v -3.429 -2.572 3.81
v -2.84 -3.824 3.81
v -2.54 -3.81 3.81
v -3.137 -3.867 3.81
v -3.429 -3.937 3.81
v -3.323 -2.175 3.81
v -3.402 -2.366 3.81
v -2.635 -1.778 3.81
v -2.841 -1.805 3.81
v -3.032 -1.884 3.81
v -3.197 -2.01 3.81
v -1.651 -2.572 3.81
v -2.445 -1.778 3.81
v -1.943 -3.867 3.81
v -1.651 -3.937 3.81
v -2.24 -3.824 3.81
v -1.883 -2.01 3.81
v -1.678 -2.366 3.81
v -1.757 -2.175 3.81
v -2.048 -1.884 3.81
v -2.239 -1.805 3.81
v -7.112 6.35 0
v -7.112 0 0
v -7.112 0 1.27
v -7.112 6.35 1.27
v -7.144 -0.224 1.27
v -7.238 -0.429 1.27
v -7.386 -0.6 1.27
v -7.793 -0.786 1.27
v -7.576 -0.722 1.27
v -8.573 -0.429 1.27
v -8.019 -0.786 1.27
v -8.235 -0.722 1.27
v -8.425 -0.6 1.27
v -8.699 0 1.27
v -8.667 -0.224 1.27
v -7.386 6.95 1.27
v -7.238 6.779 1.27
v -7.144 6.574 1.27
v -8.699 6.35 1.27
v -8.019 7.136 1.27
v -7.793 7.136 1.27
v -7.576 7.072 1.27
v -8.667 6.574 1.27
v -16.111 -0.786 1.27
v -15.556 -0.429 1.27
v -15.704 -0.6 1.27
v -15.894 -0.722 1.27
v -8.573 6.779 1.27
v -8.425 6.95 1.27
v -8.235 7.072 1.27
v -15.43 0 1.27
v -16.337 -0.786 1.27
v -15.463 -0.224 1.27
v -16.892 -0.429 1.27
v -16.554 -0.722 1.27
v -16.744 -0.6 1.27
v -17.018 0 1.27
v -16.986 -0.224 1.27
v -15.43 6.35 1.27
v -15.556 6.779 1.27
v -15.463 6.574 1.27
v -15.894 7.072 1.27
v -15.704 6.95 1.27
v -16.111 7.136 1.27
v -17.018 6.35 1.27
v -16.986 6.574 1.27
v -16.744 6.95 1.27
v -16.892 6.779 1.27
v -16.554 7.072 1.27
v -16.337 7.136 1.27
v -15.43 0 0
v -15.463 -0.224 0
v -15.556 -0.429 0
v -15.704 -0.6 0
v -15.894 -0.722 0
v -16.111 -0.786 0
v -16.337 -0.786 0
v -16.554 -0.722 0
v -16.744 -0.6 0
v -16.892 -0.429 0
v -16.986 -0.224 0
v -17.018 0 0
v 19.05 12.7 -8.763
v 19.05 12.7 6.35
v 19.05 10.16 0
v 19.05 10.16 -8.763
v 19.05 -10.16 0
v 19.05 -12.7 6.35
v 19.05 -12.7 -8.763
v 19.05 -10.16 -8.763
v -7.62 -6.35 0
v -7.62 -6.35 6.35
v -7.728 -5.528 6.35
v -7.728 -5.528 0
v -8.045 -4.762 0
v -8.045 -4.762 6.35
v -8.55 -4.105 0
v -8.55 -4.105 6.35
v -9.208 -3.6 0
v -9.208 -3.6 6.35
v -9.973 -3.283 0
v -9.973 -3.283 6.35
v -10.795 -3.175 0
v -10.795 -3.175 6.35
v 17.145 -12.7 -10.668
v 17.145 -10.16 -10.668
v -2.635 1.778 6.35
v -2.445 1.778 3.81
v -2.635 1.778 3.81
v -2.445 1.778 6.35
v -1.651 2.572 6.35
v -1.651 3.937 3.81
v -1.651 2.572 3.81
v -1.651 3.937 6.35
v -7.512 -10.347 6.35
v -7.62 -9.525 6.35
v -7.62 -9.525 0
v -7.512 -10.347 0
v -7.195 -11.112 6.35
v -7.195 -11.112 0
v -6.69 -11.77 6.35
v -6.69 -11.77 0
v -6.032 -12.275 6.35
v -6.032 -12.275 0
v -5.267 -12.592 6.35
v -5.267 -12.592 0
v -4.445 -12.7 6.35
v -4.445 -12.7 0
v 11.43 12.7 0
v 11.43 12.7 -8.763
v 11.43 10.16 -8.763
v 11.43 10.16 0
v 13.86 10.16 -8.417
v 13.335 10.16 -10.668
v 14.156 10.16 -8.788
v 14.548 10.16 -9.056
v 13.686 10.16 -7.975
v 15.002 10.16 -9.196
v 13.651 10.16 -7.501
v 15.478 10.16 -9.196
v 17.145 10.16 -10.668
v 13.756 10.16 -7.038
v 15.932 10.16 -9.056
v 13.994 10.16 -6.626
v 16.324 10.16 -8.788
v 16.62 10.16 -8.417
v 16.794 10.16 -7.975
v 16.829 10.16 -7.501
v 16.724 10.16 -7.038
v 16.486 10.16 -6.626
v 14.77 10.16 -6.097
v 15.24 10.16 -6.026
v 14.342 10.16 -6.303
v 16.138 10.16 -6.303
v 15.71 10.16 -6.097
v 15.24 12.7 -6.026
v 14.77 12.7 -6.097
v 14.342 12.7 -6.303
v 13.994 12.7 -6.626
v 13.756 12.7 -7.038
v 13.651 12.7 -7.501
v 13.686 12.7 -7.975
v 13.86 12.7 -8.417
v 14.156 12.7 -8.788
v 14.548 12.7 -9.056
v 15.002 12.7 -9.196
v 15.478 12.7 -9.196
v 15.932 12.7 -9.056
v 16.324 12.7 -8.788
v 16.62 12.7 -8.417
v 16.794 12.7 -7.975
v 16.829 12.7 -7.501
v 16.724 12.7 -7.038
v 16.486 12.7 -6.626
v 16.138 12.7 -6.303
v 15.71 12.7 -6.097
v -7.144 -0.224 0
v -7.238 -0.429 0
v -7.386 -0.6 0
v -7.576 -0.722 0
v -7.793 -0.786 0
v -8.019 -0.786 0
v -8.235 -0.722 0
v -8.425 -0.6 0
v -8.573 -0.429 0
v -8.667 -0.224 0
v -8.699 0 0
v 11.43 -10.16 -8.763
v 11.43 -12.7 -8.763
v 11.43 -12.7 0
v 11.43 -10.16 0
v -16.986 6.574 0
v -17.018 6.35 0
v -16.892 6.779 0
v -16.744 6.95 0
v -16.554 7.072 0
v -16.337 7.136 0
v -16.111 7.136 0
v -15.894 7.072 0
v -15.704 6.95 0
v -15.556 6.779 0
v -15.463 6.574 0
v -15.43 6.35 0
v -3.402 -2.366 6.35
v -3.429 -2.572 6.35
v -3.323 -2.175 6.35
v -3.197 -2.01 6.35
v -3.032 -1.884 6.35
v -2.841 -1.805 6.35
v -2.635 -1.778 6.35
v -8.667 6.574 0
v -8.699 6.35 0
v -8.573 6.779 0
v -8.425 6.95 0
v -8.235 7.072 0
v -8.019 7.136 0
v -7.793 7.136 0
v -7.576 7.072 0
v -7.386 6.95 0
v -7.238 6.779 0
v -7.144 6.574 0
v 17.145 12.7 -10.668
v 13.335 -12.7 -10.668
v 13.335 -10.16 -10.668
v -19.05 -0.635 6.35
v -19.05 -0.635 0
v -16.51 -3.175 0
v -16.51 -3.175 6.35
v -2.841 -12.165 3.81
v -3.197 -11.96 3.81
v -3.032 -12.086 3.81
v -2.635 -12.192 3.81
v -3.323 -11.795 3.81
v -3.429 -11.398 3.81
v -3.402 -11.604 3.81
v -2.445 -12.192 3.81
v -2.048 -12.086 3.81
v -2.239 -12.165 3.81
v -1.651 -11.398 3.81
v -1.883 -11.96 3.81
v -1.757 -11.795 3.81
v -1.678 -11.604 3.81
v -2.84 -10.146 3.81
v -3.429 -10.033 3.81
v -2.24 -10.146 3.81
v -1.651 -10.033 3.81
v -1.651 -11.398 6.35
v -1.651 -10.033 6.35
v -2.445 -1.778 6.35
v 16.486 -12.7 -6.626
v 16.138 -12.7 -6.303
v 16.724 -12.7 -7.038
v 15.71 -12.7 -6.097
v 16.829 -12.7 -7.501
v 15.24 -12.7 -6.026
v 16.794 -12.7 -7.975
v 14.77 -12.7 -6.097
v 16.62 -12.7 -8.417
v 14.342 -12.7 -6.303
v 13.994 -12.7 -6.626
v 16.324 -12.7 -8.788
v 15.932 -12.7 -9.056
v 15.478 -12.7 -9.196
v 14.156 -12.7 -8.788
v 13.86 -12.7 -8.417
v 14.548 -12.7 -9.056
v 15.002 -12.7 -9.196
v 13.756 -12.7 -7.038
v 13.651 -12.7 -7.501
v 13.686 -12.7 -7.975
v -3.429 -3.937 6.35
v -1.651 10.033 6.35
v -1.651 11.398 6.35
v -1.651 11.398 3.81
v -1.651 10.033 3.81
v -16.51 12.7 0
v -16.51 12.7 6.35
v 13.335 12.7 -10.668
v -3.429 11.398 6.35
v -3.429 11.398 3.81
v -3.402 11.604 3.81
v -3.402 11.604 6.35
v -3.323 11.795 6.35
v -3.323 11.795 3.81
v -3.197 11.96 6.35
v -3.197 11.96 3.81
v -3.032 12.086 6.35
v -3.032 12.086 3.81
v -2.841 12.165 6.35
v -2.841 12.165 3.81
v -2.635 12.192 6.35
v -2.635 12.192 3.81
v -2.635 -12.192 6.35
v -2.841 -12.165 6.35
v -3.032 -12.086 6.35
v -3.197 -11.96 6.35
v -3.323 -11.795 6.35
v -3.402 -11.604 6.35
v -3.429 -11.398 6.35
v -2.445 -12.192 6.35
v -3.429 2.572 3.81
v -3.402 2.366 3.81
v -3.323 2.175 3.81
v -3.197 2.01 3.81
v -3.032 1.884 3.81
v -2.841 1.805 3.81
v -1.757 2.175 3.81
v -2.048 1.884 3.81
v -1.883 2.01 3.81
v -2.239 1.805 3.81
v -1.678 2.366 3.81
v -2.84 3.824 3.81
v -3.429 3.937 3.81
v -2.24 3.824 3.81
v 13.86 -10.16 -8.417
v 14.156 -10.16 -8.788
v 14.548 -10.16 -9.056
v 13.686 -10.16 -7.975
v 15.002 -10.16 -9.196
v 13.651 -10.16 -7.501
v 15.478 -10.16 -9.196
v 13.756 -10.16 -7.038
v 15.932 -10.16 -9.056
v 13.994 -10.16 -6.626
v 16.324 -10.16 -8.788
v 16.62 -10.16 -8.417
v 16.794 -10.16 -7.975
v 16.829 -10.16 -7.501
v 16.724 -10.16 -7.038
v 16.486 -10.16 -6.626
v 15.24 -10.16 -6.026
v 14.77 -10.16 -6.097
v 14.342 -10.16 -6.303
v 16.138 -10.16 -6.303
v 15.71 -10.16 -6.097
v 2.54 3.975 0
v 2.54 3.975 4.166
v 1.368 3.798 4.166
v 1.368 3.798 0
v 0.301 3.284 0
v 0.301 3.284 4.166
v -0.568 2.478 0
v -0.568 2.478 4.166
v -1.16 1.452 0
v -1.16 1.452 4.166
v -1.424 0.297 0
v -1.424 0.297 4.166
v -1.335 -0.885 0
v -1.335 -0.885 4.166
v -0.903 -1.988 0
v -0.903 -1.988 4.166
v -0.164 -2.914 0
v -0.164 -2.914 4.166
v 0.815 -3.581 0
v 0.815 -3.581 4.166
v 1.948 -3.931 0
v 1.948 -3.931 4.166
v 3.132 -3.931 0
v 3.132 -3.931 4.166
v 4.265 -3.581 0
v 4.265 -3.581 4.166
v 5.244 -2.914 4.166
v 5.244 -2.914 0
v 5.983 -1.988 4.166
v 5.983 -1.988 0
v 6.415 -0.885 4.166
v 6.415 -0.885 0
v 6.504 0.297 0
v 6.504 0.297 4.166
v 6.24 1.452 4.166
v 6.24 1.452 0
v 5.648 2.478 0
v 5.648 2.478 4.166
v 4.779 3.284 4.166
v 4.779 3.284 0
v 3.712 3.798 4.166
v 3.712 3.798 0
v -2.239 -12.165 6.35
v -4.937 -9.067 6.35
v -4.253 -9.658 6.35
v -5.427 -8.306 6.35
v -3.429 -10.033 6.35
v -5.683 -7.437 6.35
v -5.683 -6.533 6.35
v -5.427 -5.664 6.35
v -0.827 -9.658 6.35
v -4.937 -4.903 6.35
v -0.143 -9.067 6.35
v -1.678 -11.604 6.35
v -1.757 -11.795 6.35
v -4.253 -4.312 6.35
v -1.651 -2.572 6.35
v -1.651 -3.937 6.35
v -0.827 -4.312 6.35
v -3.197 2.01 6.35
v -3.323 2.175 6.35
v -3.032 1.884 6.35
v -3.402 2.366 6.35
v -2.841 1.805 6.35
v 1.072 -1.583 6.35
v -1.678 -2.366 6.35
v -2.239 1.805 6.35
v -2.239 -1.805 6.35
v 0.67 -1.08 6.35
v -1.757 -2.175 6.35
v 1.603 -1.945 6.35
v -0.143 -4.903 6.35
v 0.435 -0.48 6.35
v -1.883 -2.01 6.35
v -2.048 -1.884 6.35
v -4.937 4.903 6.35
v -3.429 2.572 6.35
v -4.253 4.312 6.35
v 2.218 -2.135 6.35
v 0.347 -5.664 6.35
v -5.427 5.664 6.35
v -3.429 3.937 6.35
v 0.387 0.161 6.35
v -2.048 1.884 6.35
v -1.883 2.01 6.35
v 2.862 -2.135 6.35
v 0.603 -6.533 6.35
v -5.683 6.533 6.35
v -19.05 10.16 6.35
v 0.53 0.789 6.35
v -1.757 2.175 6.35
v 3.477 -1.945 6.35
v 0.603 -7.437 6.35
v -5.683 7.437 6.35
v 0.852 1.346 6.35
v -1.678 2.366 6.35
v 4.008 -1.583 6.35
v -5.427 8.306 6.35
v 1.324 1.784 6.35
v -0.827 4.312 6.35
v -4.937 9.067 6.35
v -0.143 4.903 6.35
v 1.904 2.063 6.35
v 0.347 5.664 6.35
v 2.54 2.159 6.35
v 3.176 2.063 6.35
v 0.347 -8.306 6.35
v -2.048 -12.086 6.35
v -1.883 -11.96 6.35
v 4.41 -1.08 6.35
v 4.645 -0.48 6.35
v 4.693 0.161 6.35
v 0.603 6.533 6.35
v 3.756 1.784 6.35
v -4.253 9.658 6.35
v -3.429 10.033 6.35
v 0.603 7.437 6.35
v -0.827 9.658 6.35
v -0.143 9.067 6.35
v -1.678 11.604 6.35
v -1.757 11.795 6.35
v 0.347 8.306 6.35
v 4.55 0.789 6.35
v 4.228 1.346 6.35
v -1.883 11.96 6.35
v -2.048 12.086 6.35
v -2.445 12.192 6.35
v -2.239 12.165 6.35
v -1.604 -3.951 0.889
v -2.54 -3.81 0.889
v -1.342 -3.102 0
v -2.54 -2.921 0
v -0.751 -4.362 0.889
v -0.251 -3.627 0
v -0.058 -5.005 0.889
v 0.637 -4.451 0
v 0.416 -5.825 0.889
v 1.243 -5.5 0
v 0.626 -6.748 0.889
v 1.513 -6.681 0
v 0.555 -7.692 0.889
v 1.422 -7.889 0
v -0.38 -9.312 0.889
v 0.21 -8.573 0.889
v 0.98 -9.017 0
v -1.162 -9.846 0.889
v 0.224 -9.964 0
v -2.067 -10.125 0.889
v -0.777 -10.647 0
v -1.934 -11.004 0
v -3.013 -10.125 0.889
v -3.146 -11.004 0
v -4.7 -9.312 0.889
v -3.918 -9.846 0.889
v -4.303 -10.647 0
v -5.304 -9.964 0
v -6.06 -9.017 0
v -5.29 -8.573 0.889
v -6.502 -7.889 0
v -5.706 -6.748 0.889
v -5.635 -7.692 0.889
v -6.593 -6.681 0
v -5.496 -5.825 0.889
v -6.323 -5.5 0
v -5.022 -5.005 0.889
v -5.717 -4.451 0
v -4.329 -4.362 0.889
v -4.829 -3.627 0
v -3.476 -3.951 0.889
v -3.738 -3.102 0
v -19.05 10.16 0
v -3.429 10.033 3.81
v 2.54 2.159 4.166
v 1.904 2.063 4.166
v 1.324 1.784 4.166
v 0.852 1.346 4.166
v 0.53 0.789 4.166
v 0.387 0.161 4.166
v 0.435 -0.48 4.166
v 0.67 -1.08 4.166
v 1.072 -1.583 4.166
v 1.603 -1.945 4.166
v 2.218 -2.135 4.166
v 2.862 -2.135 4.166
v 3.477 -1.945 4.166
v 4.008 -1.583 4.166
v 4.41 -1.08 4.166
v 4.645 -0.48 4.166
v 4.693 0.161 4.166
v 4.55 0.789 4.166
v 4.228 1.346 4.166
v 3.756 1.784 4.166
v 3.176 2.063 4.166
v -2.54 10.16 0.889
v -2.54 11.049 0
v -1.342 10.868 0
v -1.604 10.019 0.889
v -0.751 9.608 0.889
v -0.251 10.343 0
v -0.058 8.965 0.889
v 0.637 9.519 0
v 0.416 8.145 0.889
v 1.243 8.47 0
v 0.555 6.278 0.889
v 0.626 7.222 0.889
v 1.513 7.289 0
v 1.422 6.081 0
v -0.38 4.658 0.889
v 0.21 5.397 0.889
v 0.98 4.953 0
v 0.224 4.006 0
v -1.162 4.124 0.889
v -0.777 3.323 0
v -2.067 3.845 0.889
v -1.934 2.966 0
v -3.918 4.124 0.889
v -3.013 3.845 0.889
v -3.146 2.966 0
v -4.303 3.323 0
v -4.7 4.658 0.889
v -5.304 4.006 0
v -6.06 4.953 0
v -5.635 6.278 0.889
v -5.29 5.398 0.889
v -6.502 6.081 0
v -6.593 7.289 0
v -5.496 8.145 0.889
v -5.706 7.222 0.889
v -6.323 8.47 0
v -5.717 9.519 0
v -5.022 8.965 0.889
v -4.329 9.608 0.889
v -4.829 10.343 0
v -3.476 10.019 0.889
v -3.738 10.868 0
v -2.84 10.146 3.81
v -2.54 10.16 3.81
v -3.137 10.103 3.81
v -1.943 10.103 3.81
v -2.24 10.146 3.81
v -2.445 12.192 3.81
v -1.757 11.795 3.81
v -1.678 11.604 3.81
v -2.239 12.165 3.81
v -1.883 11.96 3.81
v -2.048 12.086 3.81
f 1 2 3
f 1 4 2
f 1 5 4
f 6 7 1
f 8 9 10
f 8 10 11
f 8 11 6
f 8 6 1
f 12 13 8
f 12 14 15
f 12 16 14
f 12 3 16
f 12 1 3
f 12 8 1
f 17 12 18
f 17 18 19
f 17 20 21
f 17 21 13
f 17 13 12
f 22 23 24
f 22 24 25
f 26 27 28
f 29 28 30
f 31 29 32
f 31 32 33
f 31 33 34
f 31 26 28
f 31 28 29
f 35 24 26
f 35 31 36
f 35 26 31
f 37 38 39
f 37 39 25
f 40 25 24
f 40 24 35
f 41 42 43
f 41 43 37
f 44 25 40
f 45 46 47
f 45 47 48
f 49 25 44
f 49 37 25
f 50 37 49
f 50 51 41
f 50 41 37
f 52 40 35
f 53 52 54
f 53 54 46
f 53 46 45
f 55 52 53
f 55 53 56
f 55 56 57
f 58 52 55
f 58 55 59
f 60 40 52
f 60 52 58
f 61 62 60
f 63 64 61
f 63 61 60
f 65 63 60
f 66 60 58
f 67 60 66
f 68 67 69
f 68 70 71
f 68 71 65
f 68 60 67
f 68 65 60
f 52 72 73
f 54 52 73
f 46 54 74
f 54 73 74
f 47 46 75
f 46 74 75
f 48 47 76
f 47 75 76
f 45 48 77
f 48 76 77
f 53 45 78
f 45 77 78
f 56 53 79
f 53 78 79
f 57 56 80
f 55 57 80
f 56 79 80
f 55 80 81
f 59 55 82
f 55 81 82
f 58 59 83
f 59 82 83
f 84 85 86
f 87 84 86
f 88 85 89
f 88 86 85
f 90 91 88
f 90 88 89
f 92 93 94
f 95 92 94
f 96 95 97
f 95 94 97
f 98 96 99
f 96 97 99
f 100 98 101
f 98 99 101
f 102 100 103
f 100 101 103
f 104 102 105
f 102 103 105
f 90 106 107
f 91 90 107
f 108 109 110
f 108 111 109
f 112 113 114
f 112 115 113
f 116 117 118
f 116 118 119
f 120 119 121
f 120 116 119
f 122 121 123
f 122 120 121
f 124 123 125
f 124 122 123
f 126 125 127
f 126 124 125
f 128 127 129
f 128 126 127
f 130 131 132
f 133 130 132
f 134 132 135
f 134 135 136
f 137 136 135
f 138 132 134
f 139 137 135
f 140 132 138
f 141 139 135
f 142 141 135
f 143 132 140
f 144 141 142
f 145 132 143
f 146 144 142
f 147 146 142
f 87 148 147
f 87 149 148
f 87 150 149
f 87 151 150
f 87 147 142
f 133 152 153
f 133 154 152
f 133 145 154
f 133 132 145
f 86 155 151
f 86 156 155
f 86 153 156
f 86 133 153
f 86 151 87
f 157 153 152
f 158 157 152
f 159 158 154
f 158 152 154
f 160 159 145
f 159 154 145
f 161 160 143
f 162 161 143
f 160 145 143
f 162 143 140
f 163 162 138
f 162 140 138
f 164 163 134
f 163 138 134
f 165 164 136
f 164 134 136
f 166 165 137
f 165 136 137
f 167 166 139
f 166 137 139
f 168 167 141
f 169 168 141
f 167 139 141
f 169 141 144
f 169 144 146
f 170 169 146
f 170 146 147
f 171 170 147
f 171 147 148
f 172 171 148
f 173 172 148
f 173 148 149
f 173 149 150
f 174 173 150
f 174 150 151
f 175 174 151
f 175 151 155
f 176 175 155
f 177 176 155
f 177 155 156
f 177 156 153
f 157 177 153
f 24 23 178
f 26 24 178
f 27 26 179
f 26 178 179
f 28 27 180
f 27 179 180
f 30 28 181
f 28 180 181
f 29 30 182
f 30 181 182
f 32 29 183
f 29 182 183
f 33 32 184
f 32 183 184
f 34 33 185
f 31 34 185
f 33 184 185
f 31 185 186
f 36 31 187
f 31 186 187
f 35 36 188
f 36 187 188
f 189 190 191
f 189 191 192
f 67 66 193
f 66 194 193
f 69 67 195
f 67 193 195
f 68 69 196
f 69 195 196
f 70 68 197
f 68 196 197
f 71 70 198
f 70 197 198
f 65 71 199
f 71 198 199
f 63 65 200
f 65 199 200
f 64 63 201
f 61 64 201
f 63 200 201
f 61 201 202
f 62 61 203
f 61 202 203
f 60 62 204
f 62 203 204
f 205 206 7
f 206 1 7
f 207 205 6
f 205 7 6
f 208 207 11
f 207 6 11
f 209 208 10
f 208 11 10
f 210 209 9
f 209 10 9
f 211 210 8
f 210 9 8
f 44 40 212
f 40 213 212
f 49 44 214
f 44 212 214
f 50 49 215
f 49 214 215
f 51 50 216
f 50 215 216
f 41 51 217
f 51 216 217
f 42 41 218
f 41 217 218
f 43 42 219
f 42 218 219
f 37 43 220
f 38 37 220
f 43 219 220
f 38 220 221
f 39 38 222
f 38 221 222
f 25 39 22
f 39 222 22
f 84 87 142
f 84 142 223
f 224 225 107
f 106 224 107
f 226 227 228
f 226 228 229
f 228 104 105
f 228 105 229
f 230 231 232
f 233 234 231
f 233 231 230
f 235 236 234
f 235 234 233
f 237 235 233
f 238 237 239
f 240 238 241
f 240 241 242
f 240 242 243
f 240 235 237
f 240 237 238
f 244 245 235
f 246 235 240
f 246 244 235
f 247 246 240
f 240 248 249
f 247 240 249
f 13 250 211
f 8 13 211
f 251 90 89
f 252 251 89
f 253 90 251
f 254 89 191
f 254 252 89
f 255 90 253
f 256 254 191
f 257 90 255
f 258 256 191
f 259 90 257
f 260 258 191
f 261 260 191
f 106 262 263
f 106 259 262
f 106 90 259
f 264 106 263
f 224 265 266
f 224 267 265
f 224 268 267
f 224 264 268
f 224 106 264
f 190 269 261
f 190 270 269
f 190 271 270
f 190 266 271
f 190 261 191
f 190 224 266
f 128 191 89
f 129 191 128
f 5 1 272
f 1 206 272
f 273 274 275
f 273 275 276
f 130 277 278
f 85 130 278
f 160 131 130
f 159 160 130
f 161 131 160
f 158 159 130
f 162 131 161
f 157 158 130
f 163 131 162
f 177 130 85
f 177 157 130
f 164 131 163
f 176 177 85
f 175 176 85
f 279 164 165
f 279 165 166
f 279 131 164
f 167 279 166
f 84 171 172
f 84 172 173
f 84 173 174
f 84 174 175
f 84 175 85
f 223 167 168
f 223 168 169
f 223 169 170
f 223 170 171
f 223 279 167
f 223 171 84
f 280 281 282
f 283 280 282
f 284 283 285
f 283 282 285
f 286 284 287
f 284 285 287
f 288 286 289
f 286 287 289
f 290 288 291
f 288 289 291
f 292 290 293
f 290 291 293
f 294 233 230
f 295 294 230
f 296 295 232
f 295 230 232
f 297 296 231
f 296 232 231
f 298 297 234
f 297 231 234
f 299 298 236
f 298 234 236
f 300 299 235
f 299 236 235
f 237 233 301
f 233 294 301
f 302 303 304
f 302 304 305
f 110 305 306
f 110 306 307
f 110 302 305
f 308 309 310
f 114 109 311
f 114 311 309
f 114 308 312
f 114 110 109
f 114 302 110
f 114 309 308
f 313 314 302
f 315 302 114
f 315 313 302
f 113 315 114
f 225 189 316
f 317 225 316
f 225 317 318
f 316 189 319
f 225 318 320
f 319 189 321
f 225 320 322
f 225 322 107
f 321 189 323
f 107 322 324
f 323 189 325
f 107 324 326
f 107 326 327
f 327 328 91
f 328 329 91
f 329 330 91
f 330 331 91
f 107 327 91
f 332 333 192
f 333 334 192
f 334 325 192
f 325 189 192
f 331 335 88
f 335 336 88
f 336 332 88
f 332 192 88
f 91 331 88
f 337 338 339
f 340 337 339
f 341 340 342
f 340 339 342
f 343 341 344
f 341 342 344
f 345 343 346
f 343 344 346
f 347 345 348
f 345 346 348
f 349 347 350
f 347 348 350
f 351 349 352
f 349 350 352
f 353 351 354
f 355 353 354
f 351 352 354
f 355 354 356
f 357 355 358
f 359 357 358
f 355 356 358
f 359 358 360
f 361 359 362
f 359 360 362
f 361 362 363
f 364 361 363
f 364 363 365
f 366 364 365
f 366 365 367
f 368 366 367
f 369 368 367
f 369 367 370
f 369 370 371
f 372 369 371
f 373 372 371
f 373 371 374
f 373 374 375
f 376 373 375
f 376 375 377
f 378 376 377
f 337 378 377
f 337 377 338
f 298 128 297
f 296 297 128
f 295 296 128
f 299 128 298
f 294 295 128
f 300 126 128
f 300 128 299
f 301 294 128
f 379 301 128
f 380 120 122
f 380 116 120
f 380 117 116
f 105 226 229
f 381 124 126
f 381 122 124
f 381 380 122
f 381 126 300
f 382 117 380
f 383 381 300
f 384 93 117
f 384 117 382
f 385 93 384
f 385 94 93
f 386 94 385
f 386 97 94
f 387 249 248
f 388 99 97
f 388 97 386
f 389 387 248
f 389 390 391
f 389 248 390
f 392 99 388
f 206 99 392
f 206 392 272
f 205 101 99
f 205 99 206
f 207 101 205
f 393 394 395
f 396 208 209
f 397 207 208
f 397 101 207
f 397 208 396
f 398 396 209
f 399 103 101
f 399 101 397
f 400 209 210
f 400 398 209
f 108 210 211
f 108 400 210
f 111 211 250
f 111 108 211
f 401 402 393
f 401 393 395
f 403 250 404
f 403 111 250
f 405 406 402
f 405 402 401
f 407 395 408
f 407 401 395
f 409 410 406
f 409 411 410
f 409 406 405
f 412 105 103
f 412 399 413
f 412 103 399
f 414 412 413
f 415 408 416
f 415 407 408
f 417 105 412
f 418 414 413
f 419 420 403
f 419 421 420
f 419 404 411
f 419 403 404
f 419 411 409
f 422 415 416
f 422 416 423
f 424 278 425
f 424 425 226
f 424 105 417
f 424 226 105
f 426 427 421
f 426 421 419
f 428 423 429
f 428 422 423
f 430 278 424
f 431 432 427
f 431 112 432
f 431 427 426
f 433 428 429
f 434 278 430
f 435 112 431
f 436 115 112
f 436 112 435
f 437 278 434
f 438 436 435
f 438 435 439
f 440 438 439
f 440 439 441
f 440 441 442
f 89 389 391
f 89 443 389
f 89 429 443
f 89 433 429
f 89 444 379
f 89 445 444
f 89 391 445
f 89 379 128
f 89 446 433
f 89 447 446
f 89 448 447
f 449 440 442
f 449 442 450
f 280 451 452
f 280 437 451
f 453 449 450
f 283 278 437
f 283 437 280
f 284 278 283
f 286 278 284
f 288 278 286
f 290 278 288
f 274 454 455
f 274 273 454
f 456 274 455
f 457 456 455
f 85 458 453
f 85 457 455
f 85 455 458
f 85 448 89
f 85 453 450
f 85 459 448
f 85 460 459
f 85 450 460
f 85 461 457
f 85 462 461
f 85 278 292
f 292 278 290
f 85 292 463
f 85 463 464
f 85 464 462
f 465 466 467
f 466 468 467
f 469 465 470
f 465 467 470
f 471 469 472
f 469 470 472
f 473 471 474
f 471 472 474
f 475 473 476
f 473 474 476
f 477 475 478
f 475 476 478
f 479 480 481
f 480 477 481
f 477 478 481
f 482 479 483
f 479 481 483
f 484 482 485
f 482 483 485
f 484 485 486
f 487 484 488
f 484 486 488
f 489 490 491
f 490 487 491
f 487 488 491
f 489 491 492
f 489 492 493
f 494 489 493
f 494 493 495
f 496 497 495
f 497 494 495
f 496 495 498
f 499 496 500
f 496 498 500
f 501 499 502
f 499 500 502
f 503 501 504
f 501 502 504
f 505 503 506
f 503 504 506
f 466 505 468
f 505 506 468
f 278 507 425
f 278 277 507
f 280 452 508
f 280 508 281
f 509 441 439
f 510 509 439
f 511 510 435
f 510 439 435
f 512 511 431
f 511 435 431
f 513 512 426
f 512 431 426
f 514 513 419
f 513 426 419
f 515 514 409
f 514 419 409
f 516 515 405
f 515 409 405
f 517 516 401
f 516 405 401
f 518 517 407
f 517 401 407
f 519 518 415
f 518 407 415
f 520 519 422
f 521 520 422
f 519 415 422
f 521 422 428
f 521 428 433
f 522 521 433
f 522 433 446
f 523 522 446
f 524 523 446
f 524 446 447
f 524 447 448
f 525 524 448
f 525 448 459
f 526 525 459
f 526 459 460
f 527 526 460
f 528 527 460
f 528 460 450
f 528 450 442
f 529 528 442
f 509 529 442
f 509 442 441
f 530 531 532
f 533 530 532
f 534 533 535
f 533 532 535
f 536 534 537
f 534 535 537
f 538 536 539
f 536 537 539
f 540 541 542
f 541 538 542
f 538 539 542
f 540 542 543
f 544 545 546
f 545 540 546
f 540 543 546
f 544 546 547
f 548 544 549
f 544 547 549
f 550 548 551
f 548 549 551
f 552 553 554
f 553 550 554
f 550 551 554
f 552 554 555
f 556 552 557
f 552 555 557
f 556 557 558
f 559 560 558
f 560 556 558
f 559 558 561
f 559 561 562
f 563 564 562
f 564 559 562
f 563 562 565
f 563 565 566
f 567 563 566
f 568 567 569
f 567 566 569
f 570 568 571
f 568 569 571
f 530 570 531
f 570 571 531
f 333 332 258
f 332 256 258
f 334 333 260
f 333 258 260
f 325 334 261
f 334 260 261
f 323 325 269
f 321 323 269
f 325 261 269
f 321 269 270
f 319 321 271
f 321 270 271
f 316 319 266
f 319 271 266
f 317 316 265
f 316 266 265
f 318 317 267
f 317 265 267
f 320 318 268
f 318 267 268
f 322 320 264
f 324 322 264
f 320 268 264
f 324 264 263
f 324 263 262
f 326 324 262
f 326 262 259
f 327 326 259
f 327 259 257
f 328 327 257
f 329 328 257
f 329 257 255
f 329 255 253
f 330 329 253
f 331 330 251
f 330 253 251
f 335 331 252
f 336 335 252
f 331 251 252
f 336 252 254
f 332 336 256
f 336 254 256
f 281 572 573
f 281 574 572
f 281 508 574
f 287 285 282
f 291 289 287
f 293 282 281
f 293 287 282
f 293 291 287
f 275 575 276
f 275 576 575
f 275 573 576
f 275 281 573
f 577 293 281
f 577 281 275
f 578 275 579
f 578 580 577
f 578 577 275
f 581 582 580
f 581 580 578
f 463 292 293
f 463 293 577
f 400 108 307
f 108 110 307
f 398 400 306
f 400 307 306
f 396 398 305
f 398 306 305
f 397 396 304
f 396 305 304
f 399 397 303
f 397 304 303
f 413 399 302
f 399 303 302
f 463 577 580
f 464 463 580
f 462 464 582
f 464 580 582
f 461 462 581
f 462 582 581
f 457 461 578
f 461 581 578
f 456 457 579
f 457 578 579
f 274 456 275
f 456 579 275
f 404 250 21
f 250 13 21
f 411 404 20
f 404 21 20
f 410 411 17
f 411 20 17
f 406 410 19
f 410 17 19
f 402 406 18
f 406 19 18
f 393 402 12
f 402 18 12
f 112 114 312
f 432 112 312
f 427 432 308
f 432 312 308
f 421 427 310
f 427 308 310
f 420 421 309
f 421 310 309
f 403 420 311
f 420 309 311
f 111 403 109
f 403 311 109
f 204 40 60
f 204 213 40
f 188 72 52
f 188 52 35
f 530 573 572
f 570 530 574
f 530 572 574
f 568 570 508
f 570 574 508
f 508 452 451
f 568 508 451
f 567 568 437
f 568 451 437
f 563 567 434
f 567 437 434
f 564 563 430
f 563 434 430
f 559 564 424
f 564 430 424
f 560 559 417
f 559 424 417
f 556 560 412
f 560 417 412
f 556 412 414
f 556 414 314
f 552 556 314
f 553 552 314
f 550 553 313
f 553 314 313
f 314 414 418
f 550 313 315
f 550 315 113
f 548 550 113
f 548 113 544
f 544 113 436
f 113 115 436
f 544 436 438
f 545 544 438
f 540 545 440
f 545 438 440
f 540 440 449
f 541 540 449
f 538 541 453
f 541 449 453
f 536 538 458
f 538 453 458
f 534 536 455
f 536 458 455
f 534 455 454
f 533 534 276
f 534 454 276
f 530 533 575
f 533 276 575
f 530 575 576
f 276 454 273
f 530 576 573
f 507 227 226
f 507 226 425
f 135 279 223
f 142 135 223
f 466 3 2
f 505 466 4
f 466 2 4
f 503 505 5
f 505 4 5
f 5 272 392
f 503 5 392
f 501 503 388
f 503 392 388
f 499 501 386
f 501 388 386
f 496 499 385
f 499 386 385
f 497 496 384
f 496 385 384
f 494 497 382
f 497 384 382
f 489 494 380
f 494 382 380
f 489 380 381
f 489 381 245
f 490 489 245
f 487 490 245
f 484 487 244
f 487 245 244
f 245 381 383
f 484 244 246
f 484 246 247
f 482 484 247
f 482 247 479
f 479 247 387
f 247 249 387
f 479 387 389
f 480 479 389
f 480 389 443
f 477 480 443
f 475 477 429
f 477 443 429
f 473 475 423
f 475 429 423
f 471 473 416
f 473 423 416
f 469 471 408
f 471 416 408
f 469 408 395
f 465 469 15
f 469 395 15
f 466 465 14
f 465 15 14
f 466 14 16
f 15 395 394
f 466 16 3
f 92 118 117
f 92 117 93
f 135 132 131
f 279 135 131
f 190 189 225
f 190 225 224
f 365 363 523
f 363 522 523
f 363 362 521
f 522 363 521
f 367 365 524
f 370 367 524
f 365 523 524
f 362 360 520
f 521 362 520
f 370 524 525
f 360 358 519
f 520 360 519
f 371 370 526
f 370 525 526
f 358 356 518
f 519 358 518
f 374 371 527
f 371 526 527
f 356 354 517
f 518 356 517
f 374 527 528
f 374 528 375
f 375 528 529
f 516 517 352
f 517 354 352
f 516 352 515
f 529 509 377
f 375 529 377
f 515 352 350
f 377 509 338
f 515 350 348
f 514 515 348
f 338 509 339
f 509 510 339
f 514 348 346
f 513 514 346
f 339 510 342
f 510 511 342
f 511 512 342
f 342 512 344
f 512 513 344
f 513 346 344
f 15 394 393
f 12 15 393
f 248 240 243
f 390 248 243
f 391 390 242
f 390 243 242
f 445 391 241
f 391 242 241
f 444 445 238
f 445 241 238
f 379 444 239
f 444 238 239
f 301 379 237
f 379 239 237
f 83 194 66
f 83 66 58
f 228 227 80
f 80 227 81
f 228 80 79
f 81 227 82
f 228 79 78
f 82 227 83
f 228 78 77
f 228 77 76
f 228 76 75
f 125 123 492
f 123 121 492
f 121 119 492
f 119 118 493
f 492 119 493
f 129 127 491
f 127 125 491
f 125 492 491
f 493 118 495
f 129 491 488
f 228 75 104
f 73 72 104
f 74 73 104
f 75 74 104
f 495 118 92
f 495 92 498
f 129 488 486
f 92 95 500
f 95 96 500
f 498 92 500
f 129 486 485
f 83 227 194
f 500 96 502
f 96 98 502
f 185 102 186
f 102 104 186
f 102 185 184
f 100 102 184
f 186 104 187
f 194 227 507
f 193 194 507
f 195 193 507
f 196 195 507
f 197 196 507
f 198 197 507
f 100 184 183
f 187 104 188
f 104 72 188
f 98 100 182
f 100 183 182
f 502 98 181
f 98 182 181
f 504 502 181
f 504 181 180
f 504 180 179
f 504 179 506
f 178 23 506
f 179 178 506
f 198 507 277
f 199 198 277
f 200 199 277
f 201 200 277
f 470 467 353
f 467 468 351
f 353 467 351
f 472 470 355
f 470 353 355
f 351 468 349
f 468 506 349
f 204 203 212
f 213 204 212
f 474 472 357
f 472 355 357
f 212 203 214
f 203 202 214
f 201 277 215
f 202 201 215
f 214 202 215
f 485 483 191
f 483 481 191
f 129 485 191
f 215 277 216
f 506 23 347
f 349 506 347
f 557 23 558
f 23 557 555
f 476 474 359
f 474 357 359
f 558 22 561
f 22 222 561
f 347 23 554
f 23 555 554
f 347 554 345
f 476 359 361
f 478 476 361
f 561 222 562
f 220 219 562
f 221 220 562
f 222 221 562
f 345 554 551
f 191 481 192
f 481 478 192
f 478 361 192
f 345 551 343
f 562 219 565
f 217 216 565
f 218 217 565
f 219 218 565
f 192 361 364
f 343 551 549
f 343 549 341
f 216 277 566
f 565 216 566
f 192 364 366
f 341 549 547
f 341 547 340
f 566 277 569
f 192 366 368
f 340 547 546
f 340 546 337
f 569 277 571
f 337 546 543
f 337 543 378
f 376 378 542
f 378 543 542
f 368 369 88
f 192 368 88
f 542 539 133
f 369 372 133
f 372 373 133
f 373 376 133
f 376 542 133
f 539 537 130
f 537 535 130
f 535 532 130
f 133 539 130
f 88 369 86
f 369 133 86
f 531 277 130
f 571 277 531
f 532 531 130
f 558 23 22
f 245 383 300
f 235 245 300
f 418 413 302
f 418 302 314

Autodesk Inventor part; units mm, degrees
ref_plane "XZ Plane" through (0, 0, 0) normal (0, 1, 0) x (-1, 0, 0)
ref_plane "XY Plane" through (0, 0, 0) normal (0, 0, 1) x (1, 0, 0)
sketch "Sketch1" plane through (0, 0, 0) normal (0, 0, 1) x (1, 0, 0)
  line L0 (0, 17.78) -> (0, -17.78) projected
  line L1 (-26.67, 0) -> (26.67, 0) projected
  line L2 (19.05, -12.7) -> (-19.05, -12.7)
  line L3 (-19.05, -12.7) -> (-19.05, 12.7)
  line L4 (-19.05, 12.7) -> (19.05, 12.7)
  line L5 (19.05, 12.7) -> (19.05, -12.7)
  line L6 (19.05, -12.7) -> (-19.05, 12.7) construction
  line L7 (-19.05, -12.7) -> (19.05, 12.7) construction
  point P0 (0, 0)
  dimension "d0" = 25.4
  dimension "d1" = 38.1
extrude "Extrusion1" add sketch "Sketch1" along normal blind 6.35
sketch "Sketch2" plane through (0, 0, 0) normal (0, 0, 1) x (1, 0, 0)
  line L0 (0, 13.335) -> (0, -13.335) projected
  line L1 (19.05, -12.7) -> (19.05, 12.7) projected
  line L2 (-19.05, -12.7) -> (19.05, -12.7) projected
  point P0 (0, 0)
  point P1 (2.54, 0)
  point P2 (-12.065, 3.175)
  dimension "d27" = 12.065
  dimension "d46" = 0
  dimension "d48" = 3.175
  dimension "d58" = 16.51
hole "Hole1" at (2.54, 0, 0) direction (0, 0, 1) diameter 4.318 end through all counterbore diameter 7.9502 counterbore depth 4.1656 clearance for "Socket Head Cap Screw" size "#8" standard "Ansi Unified Screw Threads"
sketch "Sketch3" plane through (0, 0, 0) normal (0, 0, 1) x (1, 0, 0)
  line L0 (19.05, -12.7) -> (19.05, 12.7) projected
  line L1 (19.05, 12.7) -> (-19.05, 12.7) projected
  line L2 (-19.05, -12.7) -> (19.05, -12.7) projected
  line L3 (0, 13.335) -> (0, -13.335) projected
  line L4 (-26.67, 0) -> (26.67, 0) projected
  line L5 (19.05, 12.7) -> (11.43, 12.7)
  line L6 (11.43, 12.7) -> (11.43, 10.16)
  line L7 (11.43, 10.16) -> (19.05, 10.16)
  line L8 (19.05, 10.16) -> (19.05, 12.7)
  line L9 (19.05, -12.7) -> (11.43, -12.7)
  line L10 (11.43, -12.7) -> (11.43, -10.16)
  line L11 (11.43, -10.16) -> (19.05, -10.16)
  line L12 (19.05, -10.16) -> (19.05, -12.7)
  point P0 (0, 0)
  dimension "d12" = 2.54
  dimension "d13" = 2.54
  dimension "d14" = 20.32
  dimension "d26" = 7.62
extrude "Extrusion2" add sketch "Sketch3" against normal blind 10.668 contours L2 L10 L11 L0 | L7 L6 L1 L0
sketch "Sketch4" plane through (-19.05, 12.7, 6.35) normal (0, 1, 0) x (1, 0, 0)
  line L0 (19.05, 20.4216) -> (19.05, -3.4036) projected
  line L1 (45.72, 6.35) -> (-7.62, 6.35) projected
  line L2 (30.48, 17.018) -> (38.1, 17.018) projected
  line L3 (30.48, 6.35) -> (30.48, 17.018) projected
  line L4 (38.1, 0) -> (38.1, 17.018) projected
  line L5 (38.1, 0) -> (0, 0) projected
  point P0 (19.05, 6.35)
  point P1 (34.29, 13.97)
  dimension "d17" = 3.81
  dimension "d18" = 3.81
  dimension "d36" = 13.97
  dimension "d62" = 3.048
hole "Hole2" at (15.24, 12.7, -7.62) direction (0, -1, 0) diameter 3.1877 end through all
hole "Hole3" [suppressed]
chamfer "Chamfer1" distance 1.905 angle 45 4 edges at (11.43, -11.43, -10.668) (19.05, -11.43, -10.668) (19.05, 11.43, -10.668) (11.43, 11.43, -10.668)
fillet "Fillet1" [suppressed]
sketch "Sketch5" plane through (0, 0, 0) normal (0, 0, -1) x (-1, 0, 0)
  line L0 (17.018, 0) -> (7.112, 0)
  line L1 (7.112, 0) -> (7.112, 6.35)
  line L2 (7.112, 6.35) -> (17.018, 6.35)
  line L3 (17.018, 6.35) -> (17.018, 0)
  line L4 (17.018, 0) -> (7.112, 6.35) construction
  line L5 (7.112, 0) -> (17.018, 6.35) construction
  line L6 (-11.43, -12.7) -> (19.05, -12.7) projected
  line L7 (19.05, -12.7) -> (19.05, 12.7) projected
  line L8 (19.05, -12.7) -> (7.62, -12.7)
  line L9 (7.62, -12.7) -> (7.62, -3.175)
  line L10 (7.62, -3.175) -> (19.05, -3.175)
  line L11 (19.05, -3.175) -> (19.05, -12.7)
  circle A0 centre (7.9057, 6.35) radius 0.7937
  circle A1 centre (16.2242, 6.35) radius 0.7937
  circle A2 centre (7.9057, 0) radius 0.7937
  circle A3 centre (16.2242, 0) radius 0.7938
  point P0 (0, 0)
  point P1 (12.065, 3.175)
  dimension "d53" = 1.5875
  dimension "d41" = 9.906
  dimension "d42" = 6.35
  dimension "d49" = 9.525
  dimension "d50" = 11.43
extrude "Extrusion3" cut sketch "Sketch5" against normal blind 1.27 contours A2 L0 | A2 L1 A0 L2 A1 L3 A3 L0 | L0 A2 | A3 L0 | L0 A3 | A0 L2 | L2 A0 | A1 L2 | L2 A1
fillet "Fillet2" [suppressed]
extrude "Extrusion4" cut sketch "Sketch5" against normal up to next contours L9 L10 L7 L6
ref_plane "Work Plane2" through (-12.065, 3.175, 0) normal (1, 0, 0) x (0, 1, 0)
fillet "Fillet3" radius 3.175 1 edges at (-7.62, -3.175, 3.175)
chamfer "Chamfer2" distance 2.54 angle 45 1 edges at (-19.05, -3.175, 3.175)
chamfer "Chamfer3" distance 2.54 angle 45 1 edges at (-19.05, 12.7, 3.175)
fillet "Fillet4" radius 3.175 1 edges at (-7.62, -12.7, 3.175)
sketch "Sketch6" plane through (0, 0, 0) normal (0, 0, 1) x (1, 0, 0)
  line L0 (0, 17.78) -> (0, -17.78) projected
  point P0 (0, 0)
  point P1 (-2.54, 6.985)
  point P2 (-2.54, -6.985)
  dimension "d64" = 6.985
  dimension "d65" = 13.97
  dimension "d66" = 2.54
hole "Hole4" at (-2.54, -6.985, 0) at (-2.54, 6.985, 0) direction (0, 0, 1) diameter 6.35 end through all
sketch "Sketch7" plane through (0, 0, 6.35) normal (0, 0, 1) x (1, 0, 0)
  circle A0 centre (-2.54, 6.985) radius 3.175 projected
  circle A1 centre (-2.54, -6.985) radius 3.175 projected
  line L0 (-1.651, 1.778) -> (-3.429, 1.778)
  line L1 (-3.429, 1.778) -> (-3.429, 12.192)
  line L2 (-3.429, 12.192) -> (-1.651, 12.192)
  line L3 (-1.651, 12.192) -> (-1.651, 1.778)
  line L4 (-1.651, 1.778) -> (-3.429, 12.192) construction
  line L5 (-3.429, 1.778) -> (-1.651, 12.192) construction
  line L6 (-3.429, -12.192) -> (-1.651, -12.192)
  line L7 (-1.651, -12.192) -> (-1.651, -1.778)
  line L8 (-1.651, -1.778) -> (-3.429, -1.778)
  line L9 (-3.429, -1.778) -> (-3.429, -12.192)
  line L10 (-3.429, -12.192) -> (-1.651, -1.778) construction
  line L11 (-1.651, -12.192) -> (-3.429, -1.778) construction
  circle A2 centre (2.54, 0) radius 2.159 projected
  point P0 (0, 0)
  dimension "d74" = 1.778
  dimension "d75" = 10.414
  dimension "d76" = 1.778
  dimension "d77" = 10.414
extrude "Extrusion5" cut sketch "Sketch7" against normal blind 2.54 contours L3 A0 L1 | A0 L1 L2 L3 | L3 L0 L1 A0 | L7 A1 L9 | A1 L9 L8 L7 | L7 L6 L9 A1
fillet "Fillet5" radius 0.7937 8 edges at (-3.429, 12.192, 5.08) (-1.651, 12.192, 5.08) (-3.429, 1.778, 5.08) (-1.651, 1.778, 5.08) (-3.429, -1.778, 5.08) (-1.651, -1.778, 5.08) (-3.429, -12.192, 5.08) (-1.651, -12.192, 5.08)
chamfer "Chamfer4" distance 0.889 angle 45 2 edges at (-2.54, -10.16, 0) (-2.54, 3.81, 0)
properties part number "J005823" material "ALUMINUM, 6061-T651"
